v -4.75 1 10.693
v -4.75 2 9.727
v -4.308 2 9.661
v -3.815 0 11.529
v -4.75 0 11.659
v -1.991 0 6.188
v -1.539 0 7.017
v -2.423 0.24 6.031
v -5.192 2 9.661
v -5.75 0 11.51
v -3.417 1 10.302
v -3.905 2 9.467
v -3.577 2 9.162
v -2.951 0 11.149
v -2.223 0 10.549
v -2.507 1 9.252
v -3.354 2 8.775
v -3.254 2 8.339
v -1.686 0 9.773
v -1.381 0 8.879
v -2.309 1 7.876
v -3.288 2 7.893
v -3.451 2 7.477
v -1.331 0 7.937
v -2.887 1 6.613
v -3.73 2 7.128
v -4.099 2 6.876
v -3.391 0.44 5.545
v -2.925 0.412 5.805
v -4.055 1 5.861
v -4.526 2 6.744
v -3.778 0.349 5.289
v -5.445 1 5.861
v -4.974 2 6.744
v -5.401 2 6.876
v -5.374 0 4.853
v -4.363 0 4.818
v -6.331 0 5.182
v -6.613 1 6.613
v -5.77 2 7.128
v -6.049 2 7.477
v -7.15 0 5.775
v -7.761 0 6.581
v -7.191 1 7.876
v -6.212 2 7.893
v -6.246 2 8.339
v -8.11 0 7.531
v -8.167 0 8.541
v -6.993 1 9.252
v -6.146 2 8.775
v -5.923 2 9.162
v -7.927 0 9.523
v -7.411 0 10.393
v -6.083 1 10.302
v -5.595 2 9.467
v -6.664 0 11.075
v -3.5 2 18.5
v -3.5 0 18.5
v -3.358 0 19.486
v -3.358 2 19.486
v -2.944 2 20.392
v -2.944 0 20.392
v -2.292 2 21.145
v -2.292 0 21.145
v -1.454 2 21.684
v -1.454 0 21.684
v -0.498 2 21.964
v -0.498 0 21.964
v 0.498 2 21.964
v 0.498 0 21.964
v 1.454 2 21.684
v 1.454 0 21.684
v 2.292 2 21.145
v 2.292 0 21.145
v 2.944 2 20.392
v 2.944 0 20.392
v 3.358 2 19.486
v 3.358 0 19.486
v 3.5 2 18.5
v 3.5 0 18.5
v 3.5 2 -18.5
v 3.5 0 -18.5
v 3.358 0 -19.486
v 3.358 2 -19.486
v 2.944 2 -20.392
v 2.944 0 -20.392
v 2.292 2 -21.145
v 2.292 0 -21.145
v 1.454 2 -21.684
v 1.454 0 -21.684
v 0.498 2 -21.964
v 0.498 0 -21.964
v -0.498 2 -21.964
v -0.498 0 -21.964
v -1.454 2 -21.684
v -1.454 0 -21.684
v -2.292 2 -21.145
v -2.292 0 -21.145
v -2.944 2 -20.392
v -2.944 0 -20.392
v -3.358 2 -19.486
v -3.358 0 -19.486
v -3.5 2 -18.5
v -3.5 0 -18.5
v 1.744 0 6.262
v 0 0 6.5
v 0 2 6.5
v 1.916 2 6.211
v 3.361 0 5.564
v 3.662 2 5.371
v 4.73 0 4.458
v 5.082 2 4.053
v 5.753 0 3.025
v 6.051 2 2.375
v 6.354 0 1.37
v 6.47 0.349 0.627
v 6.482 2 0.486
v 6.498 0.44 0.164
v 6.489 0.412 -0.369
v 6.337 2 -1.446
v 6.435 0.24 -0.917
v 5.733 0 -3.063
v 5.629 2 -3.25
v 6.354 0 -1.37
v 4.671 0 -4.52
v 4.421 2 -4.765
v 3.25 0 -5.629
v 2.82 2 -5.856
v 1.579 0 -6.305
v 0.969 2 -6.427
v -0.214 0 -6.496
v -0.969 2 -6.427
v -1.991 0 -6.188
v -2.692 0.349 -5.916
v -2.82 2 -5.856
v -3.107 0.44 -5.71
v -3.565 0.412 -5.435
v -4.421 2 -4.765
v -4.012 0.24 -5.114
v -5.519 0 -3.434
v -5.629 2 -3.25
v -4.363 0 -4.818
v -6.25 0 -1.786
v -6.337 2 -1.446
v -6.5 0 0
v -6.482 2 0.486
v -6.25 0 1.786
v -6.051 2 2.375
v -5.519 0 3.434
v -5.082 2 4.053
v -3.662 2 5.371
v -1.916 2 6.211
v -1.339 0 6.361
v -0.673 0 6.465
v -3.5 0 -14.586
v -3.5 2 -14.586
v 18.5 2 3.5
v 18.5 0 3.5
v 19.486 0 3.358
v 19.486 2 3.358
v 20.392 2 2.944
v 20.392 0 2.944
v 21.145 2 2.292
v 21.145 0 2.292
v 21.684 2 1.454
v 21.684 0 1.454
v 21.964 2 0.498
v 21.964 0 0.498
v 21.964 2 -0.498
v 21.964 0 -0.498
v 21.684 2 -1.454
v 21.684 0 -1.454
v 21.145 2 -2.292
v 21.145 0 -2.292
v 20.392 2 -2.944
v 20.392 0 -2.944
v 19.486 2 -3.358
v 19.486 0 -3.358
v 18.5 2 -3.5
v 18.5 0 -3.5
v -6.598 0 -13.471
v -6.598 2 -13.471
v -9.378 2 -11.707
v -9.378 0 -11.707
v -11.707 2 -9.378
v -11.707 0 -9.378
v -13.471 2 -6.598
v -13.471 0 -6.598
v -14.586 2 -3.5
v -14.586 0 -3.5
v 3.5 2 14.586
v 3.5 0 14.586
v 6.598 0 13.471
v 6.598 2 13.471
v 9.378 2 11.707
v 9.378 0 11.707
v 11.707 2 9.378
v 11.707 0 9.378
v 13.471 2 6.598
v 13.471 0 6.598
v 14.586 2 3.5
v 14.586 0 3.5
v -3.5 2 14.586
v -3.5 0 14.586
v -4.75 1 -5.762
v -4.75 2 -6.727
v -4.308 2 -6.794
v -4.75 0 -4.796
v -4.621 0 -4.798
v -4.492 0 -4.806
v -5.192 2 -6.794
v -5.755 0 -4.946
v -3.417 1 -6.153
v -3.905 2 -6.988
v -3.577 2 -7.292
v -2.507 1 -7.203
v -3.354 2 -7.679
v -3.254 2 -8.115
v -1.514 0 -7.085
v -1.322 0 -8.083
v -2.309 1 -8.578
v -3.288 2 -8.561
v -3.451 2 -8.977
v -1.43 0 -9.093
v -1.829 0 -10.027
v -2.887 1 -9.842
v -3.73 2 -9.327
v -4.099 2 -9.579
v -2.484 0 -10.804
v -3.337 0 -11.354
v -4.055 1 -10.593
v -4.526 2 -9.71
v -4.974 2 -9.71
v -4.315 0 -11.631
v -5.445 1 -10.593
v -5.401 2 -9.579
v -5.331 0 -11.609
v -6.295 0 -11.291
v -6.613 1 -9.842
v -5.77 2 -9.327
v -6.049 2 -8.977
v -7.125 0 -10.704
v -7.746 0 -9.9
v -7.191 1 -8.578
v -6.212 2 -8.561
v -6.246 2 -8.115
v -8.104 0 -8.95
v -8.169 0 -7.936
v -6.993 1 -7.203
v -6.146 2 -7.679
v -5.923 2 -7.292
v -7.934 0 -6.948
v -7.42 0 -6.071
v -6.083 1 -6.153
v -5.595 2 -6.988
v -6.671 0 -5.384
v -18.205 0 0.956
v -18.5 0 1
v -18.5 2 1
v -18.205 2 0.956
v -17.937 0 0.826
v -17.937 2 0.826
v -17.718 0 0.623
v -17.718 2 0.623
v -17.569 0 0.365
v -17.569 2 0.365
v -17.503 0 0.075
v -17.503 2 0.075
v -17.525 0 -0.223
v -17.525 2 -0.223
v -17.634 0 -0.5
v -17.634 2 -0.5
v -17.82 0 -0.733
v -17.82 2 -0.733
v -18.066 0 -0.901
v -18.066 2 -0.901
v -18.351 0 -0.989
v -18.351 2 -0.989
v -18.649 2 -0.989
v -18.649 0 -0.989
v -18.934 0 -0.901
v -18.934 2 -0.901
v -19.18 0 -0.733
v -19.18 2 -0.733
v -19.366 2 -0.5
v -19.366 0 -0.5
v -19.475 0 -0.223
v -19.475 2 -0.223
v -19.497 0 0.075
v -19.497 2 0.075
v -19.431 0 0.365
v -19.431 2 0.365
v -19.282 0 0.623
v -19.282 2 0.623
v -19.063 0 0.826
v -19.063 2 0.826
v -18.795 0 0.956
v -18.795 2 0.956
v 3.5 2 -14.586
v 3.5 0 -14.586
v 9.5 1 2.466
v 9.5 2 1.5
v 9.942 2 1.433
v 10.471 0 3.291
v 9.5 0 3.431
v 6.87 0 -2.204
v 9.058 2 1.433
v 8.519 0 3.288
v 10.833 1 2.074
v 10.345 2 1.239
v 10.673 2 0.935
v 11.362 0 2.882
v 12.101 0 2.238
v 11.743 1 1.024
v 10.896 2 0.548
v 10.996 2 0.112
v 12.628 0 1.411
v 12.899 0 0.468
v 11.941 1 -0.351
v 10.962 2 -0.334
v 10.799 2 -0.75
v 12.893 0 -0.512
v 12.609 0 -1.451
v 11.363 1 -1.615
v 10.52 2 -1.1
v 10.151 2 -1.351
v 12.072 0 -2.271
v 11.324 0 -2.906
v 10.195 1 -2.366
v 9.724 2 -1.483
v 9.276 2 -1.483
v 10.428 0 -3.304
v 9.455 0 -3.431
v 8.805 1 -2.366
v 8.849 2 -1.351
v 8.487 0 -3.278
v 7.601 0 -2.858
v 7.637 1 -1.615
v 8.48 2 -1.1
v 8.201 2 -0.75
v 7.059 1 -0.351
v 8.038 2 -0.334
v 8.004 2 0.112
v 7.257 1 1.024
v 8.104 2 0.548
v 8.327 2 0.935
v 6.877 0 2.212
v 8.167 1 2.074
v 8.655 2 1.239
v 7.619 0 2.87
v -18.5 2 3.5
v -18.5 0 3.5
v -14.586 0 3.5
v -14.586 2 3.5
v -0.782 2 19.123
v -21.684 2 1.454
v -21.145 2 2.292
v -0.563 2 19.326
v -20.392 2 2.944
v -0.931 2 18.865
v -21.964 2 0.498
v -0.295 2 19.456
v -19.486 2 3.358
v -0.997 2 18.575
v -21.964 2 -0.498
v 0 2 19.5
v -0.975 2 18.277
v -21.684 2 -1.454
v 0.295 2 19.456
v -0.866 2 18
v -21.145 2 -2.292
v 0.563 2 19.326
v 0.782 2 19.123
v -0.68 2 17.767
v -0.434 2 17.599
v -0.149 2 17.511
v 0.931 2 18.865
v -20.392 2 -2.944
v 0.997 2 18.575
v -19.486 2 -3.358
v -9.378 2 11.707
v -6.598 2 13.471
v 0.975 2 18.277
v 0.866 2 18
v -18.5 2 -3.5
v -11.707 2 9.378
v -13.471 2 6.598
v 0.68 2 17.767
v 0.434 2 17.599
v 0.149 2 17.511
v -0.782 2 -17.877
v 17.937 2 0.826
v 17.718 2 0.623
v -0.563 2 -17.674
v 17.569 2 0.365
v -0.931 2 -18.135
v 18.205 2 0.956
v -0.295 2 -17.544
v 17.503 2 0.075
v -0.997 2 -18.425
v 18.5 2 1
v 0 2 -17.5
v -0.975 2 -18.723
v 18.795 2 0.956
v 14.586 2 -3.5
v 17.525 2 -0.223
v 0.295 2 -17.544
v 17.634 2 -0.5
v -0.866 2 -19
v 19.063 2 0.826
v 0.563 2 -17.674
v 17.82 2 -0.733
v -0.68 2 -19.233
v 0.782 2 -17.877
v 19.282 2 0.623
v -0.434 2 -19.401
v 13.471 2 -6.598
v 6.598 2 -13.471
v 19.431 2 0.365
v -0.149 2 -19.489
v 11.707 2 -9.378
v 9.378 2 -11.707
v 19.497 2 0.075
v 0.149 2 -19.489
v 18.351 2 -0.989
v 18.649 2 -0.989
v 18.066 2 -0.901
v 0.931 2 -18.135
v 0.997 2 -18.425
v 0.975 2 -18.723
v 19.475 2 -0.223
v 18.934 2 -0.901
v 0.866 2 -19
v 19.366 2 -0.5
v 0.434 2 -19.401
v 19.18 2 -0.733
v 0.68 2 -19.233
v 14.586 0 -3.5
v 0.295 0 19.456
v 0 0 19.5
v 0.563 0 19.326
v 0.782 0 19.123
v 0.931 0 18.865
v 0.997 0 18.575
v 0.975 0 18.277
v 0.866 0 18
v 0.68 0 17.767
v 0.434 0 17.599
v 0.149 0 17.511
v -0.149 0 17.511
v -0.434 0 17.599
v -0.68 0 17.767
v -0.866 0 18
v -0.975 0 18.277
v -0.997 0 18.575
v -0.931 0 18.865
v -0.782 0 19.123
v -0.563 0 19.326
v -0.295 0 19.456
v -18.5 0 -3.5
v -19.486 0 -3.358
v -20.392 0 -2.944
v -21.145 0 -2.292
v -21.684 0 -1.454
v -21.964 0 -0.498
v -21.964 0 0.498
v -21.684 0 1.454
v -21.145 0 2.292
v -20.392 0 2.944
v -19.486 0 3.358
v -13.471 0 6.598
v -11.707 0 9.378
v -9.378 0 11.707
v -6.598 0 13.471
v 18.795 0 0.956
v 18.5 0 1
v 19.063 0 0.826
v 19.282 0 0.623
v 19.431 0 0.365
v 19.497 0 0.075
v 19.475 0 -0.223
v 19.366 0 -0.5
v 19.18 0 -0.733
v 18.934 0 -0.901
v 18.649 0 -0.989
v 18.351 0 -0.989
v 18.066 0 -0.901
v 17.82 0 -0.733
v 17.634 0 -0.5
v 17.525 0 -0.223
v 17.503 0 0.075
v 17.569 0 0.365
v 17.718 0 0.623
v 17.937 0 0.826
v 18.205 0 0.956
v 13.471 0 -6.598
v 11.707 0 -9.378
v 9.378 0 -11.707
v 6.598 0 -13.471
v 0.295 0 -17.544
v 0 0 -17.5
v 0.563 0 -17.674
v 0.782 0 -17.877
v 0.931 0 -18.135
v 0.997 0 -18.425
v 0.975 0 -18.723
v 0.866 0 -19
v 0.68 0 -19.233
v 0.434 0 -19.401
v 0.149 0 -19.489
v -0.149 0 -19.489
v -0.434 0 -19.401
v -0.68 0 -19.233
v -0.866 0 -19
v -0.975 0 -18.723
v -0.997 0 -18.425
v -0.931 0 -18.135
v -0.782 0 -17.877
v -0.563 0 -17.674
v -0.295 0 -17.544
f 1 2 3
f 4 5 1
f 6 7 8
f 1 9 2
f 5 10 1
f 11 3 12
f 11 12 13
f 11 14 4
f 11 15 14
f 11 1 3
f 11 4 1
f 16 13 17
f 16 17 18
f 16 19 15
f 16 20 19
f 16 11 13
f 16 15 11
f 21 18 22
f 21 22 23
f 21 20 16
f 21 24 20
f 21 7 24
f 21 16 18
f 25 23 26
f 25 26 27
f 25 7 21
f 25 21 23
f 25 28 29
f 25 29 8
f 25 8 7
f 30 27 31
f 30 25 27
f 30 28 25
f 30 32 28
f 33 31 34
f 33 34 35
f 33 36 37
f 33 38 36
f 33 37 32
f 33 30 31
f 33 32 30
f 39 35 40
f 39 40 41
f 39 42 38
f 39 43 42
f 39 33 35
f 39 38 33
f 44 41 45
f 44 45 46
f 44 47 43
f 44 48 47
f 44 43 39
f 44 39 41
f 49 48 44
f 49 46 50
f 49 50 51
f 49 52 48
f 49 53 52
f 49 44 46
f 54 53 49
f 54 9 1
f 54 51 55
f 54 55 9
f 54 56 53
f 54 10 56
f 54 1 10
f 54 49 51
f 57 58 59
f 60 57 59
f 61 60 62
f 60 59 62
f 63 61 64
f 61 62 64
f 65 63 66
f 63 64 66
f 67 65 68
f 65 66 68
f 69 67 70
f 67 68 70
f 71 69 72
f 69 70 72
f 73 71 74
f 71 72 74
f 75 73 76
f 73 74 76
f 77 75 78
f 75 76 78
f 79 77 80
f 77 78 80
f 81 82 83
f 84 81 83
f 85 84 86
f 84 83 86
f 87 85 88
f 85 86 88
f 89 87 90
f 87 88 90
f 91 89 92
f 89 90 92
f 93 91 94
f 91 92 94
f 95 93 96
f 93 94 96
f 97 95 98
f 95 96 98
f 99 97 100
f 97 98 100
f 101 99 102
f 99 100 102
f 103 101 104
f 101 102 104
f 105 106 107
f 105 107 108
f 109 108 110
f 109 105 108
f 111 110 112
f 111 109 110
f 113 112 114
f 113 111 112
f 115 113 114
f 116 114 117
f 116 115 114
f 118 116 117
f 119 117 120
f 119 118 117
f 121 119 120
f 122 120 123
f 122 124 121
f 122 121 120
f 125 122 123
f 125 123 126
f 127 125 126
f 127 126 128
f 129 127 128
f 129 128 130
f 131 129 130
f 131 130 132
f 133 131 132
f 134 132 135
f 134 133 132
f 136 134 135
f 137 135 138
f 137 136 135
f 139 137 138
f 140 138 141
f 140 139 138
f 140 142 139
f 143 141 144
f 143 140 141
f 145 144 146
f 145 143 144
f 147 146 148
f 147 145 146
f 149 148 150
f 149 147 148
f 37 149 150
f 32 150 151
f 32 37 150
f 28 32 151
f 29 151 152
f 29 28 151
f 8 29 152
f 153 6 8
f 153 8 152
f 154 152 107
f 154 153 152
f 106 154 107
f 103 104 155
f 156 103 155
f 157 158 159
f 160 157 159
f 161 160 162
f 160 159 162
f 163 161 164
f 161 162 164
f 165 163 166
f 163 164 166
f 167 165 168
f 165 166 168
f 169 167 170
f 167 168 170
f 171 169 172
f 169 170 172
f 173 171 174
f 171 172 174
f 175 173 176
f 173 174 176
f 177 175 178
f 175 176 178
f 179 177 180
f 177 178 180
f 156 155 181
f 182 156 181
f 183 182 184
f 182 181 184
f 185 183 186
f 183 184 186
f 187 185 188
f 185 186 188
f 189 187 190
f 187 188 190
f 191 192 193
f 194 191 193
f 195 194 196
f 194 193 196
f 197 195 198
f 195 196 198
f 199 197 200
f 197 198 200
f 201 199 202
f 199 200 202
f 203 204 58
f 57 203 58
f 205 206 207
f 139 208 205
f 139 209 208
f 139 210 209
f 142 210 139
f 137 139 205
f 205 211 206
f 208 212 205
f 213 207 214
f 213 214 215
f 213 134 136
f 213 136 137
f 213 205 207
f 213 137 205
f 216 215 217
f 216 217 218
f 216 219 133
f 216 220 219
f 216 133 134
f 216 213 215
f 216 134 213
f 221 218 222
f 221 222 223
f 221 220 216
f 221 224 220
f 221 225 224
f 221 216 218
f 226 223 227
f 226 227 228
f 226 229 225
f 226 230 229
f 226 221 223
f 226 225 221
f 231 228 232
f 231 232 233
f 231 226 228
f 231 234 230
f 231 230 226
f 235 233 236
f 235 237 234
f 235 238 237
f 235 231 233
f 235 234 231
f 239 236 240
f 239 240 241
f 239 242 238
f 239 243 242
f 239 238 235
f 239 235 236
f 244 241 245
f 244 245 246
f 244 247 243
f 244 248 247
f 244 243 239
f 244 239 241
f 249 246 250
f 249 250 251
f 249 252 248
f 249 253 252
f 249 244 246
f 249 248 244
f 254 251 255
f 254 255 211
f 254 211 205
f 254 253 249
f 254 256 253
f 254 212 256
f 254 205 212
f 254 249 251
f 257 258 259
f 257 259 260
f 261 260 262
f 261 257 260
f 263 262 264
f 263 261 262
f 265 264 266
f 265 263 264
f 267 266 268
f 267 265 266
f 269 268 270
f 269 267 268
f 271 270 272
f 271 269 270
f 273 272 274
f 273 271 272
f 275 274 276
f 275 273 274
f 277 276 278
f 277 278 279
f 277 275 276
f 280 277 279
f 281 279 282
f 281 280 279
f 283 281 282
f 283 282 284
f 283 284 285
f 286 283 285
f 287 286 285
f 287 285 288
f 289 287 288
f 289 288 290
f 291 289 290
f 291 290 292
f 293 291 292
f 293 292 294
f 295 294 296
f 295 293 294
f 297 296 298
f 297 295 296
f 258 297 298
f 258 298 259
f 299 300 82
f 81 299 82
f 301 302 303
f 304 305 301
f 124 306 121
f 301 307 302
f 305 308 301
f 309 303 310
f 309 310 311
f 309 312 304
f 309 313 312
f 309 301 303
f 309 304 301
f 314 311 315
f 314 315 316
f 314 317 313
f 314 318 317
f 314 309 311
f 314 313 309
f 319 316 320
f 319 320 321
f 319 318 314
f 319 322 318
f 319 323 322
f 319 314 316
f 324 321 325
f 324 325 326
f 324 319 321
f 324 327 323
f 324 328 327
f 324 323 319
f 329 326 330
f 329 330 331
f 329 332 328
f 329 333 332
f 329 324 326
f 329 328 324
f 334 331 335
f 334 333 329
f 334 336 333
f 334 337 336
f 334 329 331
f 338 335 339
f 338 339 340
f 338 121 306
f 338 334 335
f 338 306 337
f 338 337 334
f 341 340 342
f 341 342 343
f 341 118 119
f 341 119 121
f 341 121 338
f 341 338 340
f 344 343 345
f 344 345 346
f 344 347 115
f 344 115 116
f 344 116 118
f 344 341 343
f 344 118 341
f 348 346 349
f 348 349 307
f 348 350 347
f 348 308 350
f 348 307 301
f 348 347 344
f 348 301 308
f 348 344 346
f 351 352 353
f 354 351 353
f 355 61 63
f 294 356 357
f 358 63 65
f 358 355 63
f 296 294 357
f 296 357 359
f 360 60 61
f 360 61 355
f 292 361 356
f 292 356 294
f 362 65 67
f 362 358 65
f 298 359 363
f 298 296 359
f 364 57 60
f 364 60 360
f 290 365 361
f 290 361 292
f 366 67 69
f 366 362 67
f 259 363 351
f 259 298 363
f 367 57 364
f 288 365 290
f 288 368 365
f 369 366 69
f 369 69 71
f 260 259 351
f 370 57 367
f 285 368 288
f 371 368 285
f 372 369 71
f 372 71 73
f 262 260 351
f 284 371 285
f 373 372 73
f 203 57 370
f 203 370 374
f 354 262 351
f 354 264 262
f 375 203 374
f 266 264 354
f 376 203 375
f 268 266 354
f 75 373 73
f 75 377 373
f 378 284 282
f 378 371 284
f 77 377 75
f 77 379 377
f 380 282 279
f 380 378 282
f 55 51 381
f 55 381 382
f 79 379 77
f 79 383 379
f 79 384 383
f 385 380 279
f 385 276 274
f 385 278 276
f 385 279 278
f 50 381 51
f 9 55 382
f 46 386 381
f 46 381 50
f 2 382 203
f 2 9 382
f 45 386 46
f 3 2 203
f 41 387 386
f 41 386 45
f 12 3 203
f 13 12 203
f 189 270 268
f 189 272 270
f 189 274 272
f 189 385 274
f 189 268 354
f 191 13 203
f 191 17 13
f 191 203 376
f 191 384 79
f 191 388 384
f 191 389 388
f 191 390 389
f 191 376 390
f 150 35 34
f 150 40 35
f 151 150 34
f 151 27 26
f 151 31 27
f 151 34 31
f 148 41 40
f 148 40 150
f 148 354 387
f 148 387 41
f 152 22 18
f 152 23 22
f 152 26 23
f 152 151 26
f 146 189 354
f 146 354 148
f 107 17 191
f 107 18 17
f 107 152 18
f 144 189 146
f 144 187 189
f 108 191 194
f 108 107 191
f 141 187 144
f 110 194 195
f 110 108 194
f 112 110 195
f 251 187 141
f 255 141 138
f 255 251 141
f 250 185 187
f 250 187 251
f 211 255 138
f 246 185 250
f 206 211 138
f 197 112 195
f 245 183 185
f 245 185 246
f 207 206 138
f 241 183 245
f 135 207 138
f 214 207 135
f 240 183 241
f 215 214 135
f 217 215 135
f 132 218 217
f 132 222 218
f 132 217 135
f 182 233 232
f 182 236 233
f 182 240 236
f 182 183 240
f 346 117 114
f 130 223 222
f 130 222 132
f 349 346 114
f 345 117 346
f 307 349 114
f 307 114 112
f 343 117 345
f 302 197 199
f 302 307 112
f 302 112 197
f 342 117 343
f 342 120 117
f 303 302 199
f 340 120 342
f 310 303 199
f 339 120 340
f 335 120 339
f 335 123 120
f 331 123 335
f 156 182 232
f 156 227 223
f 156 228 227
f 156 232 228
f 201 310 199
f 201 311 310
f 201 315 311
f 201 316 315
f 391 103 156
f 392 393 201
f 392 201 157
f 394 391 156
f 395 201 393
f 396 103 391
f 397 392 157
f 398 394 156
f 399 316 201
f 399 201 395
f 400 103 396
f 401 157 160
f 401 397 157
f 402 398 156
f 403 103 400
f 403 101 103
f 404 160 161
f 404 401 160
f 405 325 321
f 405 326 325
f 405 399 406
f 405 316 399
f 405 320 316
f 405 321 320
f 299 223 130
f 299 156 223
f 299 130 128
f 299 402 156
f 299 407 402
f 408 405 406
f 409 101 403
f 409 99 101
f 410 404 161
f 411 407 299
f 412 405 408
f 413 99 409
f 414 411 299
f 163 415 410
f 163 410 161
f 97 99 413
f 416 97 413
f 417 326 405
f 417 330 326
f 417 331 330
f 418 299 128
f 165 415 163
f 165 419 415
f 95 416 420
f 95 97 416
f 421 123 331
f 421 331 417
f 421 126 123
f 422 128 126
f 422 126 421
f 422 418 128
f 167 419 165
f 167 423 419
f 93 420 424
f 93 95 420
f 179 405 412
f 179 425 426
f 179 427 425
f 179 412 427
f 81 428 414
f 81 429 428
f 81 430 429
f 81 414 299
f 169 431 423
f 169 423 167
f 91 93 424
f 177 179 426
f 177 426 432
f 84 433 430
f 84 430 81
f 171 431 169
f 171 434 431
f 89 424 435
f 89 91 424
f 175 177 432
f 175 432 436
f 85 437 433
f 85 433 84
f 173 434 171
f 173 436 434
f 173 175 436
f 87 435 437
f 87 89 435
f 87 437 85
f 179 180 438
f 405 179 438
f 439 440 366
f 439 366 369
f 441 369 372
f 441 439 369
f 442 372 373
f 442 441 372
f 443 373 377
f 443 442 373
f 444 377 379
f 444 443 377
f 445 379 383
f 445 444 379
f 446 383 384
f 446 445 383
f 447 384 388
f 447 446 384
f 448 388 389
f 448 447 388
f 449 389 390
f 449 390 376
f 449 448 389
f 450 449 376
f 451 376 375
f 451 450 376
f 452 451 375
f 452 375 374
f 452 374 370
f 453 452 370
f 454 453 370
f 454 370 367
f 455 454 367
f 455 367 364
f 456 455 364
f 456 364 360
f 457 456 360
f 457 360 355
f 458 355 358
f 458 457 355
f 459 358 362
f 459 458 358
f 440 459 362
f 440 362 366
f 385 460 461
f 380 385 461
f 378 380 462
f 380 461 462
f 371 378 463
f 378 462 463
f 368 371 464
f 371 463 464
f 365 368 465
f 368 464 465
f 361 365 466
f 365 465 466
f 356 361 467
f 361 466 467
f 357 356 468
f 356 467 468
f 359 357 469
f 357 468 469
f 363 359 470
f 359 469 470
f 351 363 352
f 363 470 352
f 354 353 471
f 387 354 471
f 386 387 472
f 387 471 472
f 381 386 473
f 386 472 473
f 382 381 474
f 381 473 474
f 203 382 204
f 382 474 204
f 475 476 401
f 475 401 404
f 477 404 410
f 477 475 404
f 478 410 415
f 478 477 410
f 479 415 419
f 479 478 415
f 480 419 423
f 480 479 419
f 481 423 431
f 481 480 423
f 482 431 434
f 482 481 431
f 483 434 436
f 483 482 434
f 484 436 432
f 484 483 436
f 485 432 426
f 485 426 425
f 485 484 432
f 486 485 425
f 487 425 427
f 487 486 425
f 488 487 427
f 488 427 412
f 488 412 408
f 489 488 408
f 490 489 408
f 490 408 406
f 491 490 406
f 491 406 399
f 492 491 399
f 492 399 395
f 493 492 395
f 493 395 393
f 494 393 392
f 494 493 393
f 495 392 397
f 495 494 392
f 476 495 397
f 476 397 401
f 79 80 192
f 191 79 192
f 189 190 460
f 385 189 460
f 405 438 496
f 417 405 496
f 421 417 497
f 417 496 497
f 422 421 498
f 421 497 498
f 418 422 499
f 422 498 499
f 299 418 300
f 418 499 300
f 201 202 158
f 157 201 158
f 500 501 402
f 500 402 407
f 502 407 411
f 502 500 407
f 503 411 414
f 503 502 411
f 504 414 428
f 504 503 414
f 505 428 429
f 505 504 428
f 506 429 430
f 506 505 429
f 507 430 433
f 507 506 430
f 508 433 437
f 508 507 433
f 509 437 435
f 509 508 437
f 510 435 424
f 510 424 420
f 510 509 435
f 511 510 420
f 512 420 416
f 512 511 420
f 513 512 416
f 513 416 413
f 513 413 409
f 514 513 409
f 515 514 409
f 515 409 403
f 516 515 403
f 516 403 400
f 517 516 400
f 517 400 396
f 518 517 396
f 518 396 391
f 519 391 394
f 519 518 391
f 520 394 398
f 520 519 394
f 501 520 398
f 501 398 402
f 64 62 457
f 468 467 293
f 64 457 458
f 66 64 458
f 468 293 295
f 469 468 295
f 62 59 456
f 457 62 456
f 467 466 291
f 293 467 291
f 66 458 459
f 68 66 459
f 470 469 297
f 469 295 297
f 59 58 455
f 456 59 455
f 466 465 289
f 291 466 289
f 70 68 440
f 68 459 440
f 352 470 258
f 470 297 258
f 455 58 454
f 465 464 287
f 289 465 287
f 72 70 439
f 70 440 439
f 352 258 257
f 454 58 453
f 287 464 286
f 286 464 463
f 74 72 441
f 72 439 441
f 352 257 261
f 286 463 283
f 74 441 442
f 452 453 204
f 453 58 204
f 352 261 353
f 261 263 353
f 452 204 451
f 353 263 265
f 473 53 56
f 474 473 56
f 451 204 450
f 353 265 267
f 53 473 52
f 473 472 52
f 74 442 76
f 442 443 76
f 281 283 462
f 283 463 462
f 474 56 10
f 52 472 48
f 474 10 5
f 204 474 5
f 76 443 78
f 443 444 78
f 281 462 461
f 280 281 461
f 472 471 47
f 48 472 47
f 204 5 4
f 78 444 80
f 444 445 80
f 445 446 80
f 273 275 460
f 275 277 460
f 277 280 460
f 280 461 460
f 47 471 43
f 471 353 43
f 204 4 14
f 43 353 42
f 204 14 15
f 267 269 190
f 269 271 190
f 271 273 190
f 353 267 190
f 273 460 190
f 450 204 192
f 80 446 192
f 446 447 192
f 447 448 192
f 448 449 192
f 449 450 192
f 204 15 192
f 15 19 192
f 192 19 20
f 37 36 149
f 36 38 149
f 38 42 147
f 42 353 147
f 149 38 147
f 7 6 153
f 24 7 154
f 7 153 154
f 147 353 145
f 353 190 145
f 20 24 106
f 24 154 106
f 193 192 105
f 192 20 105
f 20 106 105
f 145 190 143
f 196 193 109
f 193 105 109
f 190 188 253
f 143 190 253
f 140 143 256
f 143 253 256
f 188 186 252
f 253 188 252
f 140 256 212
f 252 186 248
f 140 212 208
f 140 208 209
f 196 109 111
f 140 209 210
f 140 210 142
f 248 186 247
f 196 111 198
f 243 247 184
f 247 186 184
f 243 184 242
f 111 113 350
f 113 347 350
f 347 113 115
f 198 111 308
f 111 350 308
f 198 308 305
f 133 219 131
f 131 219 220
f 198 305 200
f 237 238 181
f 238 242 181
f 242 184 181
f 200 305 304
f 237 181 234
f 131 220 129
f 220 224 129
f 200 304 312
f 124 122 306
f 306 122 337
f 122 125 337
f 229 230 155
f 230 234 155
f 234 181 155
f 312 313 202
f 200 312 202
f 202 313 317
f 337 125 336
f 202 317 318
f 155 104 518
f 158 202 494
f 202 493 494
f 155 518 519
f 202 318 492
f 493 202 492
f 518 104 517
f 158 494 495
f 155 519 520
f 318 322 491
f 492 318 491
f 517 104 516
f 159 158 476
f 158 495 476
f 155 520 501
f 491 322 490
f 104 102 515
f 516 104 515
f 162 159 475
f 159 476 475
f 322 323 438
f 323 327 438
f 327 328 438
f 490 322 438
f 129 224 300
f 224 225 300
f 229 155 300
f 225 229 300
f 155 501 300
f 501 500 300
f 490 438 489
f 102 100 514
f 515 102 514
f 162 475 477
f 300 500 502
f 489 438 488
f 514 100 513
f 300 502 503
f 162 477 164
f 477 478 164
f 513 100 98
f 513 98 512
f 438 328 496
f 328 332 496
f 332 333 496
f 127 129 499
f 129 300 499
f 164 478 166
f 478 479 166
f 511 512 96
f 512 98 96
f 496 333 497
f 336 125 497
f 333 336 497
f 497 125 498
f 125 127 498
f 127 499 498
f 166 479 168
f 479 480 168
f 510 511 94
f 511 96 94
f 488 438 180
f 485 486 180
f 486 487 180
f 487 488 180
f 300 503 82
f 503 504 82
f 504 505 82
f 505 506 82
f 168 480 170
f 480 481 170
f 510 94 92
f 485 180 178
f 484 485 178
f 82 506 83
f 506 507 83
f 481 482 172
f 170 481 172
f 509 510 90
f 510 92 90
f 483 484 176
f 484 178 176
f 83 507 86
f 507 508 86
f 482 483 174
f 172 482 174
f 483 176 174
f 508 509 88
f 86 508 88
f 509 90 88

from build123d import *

# Parameters (mm, degrees)
SKETCH_2_R       = 15
SKETCH_2_R_2     = 6.5
SKETCH_2_R_3     = 1.5
EXTRUDE_1_DEPTH  = 2
CHAMFER_1_SIZE   = 2
CHAMFER_1_SIZE_2 = 1.93137755
SKETCH_3_R       = 1
EXTRUDE_2_DEPTH  = 2


with BuildPart() as part:
    # 草图2 → 凸台-拉伸1 (new body)
    with BuildSketch(Plane(origin=(0, 0, 0), x_dir=(1, 0, 0), z_dir=(0, 1, 0))):
        with Locations(Location((0, 0, 0), (0, 0, 270))):
            Circle(SKETCH_2_R)
        with Locations(Location((0, 0, 0), (0, 0, 270))):
            Circle(SKETCH_2_R_2, mode=Mode.SUBTRACT)
        with Locations(Location((9.5, 0, 0), (0, 0, 270))):
            Circle(SKETCH_2_R_3, mode=Mode.SUBTRACT)
        with Locations(Location((-4.75, -8.227241336, 0), (0, 0, 270))):
            Circle(SKETCH_2_R_3, mode=Mode.SUBTRACT)
        with Locations(Location((-4.75, 8.227241336, 0), (0, 0, 270))):
            Circle(SKETCH_2_R_3, mode=Mode.SUBTRACT)
    extrude(amount=EXTRUDE_1_DEPTH)

    # 倒角1
    # the kernel refuses this chamfer: 2, 1.93137755 mm, written as the material it takes off along each edge
    with BuildSketch(Plane(origin=(-4.75, 0, 8.227241336), x_dir=(0, 0, 1), z_dir=(-1, 0, 0))) as chamfer_1_piece_1:
        Polygon((1.5, CHAMFER_1_SIZE), (1.5 + CHAMFER_1_SIZE_2, 0), (1.5, 0), align=None)
    revolve(axis=Axis((-4.75, 0, 8.227241336), (0, 1, 0)), mode=Mode.SUBTRACT)
    with BuildSketch(Plane(origin=(-4.75, 0, -8.227241336), x_dir=(0, 0, 1), z_dir=(-1, 0, 0))) as chamfer_1_piece_2:
        Polygon((1.5, CHAMFER_1_SIZE), (1.5 + CHAMFER_1_SIZE_2, 0), (1.5, 0), align=None)
    revolve(axis=Axis((-4.75, 0, -8.227241336), (0, 1, 0)), mode=Mode.SUBTRACT)
    with BuildSketch(Plane(origin=(9.5, 0, 0), x_dir=(0, 0, 1), z_dir=(-1, 0, 0))) as chamfer_1_piece_3:
        Polygon((1.5, CHAMFER_1_SIZE), (1.5 + CHAMFER_1_SIZE_2, 0), (1.5, 0), align=None)
    revolve(axis=Axis((9.5, 0, 0), (0, 1, 0)), mode=Mode.SUBTRACT)

    # 草图3 → 凸台-拉伸2 (add)
    # profile 1 of 4: a face of its own
    with BuildSketch(Plane(origin=(0, 0, 0), x_dir=(1, 0, 0), z_dir=(0, 1, 0))):
        with BuildLine():
            Line((-18.5, -3.5), (-14.585952146, -3.5))
            ThreePointArc((-14.585952146, -3.5), (-15, 0), (-14.585952146, 3.5))
            Line((-14.585952146, 3.5), (-18.5, 3.5))
            ThreePointArc((-18.5, 3.5), (-22, 0), (-18.5, -3.5))
        make_face()
        with Locations(Location((-18.5, 0, 0), (0, 0, 270))):
            Circle(SKETCH_3_R, mode=Mode.SUBTRACT)
    # profile 2 of 4: a face of its own
    with BuildSketch(Plane(origin=(0, 0, 0), x_dir=(1, 0, 0), z_dir=(0, 1, 0))):
        with BuildLine():
            Line((-3.5, 18.5), (-3.5, 14.585952146))
            ThreePointArc((-3.5, 14.585952146), (0, 15), (3.5, 14.585952146))
            Line((3.5, 14.585952146), (3.5, 18.5))
            ThreePointArc((3.5, 18.5), (0, 22), (-3.5, 18.5))
        make_face()
        with Locations(Location((0, 18.5, 0), (0, 0, 270))):
            Circle(SKETCH_3_R, mode=Mode.SUBTRACT)
    # profile 3 of 4: a face of its own
    with BuildSketch(Plane(origin=(0, 0, 0), x_dir=(1, 0, 0), z_dir=(0, 1, 0))):
        with BuildLine():
            Line((18.5, 3.5), (14.585952146, 3.5))
            ThreePointArc((14.585952146, 3.5), (15, 0), (14.585952146, -3.5))
            Line((14.585952146, -3.5), (18.5, -3.5))
            ThreePointArc((18.5, -3.5), (22, 0), (18.5, 3.5))
        make_face()
        with Locations(Location((18.5, 0, 0), (0, 0, 270))):
            Circle(SKETCH_3_R, mode=Mode.SUBTRACT)
    # profile 4 of 4: a face of its own
    with BuildSketch(Plane(origin=(0, 0, 0), x_dir=(1, 0, 0), z_dir=(0, 1, 0))):
        with BuildLine():
            Line((3.5, -18.5), (3.5, -14.585952146))
            ThreePointArc((3.5, -14.585952146), (0, -15), (-3.5, -14.585952146))
            Line((-3.5, -14.585952146), (-3.5, -18.5))
            ThreePointArc((-3.5, -18.5), (0, -22), (3.5, -18.5))
        make_face()
        with Locations(Location((0, -18.5, 0), (0, 0, 270))):
            Circle(SKETCH_3_R, mode=Mode.SUBTRACT)
    extrude(amount=EXTRUDE_2_DEPTH)


solid = part.part
